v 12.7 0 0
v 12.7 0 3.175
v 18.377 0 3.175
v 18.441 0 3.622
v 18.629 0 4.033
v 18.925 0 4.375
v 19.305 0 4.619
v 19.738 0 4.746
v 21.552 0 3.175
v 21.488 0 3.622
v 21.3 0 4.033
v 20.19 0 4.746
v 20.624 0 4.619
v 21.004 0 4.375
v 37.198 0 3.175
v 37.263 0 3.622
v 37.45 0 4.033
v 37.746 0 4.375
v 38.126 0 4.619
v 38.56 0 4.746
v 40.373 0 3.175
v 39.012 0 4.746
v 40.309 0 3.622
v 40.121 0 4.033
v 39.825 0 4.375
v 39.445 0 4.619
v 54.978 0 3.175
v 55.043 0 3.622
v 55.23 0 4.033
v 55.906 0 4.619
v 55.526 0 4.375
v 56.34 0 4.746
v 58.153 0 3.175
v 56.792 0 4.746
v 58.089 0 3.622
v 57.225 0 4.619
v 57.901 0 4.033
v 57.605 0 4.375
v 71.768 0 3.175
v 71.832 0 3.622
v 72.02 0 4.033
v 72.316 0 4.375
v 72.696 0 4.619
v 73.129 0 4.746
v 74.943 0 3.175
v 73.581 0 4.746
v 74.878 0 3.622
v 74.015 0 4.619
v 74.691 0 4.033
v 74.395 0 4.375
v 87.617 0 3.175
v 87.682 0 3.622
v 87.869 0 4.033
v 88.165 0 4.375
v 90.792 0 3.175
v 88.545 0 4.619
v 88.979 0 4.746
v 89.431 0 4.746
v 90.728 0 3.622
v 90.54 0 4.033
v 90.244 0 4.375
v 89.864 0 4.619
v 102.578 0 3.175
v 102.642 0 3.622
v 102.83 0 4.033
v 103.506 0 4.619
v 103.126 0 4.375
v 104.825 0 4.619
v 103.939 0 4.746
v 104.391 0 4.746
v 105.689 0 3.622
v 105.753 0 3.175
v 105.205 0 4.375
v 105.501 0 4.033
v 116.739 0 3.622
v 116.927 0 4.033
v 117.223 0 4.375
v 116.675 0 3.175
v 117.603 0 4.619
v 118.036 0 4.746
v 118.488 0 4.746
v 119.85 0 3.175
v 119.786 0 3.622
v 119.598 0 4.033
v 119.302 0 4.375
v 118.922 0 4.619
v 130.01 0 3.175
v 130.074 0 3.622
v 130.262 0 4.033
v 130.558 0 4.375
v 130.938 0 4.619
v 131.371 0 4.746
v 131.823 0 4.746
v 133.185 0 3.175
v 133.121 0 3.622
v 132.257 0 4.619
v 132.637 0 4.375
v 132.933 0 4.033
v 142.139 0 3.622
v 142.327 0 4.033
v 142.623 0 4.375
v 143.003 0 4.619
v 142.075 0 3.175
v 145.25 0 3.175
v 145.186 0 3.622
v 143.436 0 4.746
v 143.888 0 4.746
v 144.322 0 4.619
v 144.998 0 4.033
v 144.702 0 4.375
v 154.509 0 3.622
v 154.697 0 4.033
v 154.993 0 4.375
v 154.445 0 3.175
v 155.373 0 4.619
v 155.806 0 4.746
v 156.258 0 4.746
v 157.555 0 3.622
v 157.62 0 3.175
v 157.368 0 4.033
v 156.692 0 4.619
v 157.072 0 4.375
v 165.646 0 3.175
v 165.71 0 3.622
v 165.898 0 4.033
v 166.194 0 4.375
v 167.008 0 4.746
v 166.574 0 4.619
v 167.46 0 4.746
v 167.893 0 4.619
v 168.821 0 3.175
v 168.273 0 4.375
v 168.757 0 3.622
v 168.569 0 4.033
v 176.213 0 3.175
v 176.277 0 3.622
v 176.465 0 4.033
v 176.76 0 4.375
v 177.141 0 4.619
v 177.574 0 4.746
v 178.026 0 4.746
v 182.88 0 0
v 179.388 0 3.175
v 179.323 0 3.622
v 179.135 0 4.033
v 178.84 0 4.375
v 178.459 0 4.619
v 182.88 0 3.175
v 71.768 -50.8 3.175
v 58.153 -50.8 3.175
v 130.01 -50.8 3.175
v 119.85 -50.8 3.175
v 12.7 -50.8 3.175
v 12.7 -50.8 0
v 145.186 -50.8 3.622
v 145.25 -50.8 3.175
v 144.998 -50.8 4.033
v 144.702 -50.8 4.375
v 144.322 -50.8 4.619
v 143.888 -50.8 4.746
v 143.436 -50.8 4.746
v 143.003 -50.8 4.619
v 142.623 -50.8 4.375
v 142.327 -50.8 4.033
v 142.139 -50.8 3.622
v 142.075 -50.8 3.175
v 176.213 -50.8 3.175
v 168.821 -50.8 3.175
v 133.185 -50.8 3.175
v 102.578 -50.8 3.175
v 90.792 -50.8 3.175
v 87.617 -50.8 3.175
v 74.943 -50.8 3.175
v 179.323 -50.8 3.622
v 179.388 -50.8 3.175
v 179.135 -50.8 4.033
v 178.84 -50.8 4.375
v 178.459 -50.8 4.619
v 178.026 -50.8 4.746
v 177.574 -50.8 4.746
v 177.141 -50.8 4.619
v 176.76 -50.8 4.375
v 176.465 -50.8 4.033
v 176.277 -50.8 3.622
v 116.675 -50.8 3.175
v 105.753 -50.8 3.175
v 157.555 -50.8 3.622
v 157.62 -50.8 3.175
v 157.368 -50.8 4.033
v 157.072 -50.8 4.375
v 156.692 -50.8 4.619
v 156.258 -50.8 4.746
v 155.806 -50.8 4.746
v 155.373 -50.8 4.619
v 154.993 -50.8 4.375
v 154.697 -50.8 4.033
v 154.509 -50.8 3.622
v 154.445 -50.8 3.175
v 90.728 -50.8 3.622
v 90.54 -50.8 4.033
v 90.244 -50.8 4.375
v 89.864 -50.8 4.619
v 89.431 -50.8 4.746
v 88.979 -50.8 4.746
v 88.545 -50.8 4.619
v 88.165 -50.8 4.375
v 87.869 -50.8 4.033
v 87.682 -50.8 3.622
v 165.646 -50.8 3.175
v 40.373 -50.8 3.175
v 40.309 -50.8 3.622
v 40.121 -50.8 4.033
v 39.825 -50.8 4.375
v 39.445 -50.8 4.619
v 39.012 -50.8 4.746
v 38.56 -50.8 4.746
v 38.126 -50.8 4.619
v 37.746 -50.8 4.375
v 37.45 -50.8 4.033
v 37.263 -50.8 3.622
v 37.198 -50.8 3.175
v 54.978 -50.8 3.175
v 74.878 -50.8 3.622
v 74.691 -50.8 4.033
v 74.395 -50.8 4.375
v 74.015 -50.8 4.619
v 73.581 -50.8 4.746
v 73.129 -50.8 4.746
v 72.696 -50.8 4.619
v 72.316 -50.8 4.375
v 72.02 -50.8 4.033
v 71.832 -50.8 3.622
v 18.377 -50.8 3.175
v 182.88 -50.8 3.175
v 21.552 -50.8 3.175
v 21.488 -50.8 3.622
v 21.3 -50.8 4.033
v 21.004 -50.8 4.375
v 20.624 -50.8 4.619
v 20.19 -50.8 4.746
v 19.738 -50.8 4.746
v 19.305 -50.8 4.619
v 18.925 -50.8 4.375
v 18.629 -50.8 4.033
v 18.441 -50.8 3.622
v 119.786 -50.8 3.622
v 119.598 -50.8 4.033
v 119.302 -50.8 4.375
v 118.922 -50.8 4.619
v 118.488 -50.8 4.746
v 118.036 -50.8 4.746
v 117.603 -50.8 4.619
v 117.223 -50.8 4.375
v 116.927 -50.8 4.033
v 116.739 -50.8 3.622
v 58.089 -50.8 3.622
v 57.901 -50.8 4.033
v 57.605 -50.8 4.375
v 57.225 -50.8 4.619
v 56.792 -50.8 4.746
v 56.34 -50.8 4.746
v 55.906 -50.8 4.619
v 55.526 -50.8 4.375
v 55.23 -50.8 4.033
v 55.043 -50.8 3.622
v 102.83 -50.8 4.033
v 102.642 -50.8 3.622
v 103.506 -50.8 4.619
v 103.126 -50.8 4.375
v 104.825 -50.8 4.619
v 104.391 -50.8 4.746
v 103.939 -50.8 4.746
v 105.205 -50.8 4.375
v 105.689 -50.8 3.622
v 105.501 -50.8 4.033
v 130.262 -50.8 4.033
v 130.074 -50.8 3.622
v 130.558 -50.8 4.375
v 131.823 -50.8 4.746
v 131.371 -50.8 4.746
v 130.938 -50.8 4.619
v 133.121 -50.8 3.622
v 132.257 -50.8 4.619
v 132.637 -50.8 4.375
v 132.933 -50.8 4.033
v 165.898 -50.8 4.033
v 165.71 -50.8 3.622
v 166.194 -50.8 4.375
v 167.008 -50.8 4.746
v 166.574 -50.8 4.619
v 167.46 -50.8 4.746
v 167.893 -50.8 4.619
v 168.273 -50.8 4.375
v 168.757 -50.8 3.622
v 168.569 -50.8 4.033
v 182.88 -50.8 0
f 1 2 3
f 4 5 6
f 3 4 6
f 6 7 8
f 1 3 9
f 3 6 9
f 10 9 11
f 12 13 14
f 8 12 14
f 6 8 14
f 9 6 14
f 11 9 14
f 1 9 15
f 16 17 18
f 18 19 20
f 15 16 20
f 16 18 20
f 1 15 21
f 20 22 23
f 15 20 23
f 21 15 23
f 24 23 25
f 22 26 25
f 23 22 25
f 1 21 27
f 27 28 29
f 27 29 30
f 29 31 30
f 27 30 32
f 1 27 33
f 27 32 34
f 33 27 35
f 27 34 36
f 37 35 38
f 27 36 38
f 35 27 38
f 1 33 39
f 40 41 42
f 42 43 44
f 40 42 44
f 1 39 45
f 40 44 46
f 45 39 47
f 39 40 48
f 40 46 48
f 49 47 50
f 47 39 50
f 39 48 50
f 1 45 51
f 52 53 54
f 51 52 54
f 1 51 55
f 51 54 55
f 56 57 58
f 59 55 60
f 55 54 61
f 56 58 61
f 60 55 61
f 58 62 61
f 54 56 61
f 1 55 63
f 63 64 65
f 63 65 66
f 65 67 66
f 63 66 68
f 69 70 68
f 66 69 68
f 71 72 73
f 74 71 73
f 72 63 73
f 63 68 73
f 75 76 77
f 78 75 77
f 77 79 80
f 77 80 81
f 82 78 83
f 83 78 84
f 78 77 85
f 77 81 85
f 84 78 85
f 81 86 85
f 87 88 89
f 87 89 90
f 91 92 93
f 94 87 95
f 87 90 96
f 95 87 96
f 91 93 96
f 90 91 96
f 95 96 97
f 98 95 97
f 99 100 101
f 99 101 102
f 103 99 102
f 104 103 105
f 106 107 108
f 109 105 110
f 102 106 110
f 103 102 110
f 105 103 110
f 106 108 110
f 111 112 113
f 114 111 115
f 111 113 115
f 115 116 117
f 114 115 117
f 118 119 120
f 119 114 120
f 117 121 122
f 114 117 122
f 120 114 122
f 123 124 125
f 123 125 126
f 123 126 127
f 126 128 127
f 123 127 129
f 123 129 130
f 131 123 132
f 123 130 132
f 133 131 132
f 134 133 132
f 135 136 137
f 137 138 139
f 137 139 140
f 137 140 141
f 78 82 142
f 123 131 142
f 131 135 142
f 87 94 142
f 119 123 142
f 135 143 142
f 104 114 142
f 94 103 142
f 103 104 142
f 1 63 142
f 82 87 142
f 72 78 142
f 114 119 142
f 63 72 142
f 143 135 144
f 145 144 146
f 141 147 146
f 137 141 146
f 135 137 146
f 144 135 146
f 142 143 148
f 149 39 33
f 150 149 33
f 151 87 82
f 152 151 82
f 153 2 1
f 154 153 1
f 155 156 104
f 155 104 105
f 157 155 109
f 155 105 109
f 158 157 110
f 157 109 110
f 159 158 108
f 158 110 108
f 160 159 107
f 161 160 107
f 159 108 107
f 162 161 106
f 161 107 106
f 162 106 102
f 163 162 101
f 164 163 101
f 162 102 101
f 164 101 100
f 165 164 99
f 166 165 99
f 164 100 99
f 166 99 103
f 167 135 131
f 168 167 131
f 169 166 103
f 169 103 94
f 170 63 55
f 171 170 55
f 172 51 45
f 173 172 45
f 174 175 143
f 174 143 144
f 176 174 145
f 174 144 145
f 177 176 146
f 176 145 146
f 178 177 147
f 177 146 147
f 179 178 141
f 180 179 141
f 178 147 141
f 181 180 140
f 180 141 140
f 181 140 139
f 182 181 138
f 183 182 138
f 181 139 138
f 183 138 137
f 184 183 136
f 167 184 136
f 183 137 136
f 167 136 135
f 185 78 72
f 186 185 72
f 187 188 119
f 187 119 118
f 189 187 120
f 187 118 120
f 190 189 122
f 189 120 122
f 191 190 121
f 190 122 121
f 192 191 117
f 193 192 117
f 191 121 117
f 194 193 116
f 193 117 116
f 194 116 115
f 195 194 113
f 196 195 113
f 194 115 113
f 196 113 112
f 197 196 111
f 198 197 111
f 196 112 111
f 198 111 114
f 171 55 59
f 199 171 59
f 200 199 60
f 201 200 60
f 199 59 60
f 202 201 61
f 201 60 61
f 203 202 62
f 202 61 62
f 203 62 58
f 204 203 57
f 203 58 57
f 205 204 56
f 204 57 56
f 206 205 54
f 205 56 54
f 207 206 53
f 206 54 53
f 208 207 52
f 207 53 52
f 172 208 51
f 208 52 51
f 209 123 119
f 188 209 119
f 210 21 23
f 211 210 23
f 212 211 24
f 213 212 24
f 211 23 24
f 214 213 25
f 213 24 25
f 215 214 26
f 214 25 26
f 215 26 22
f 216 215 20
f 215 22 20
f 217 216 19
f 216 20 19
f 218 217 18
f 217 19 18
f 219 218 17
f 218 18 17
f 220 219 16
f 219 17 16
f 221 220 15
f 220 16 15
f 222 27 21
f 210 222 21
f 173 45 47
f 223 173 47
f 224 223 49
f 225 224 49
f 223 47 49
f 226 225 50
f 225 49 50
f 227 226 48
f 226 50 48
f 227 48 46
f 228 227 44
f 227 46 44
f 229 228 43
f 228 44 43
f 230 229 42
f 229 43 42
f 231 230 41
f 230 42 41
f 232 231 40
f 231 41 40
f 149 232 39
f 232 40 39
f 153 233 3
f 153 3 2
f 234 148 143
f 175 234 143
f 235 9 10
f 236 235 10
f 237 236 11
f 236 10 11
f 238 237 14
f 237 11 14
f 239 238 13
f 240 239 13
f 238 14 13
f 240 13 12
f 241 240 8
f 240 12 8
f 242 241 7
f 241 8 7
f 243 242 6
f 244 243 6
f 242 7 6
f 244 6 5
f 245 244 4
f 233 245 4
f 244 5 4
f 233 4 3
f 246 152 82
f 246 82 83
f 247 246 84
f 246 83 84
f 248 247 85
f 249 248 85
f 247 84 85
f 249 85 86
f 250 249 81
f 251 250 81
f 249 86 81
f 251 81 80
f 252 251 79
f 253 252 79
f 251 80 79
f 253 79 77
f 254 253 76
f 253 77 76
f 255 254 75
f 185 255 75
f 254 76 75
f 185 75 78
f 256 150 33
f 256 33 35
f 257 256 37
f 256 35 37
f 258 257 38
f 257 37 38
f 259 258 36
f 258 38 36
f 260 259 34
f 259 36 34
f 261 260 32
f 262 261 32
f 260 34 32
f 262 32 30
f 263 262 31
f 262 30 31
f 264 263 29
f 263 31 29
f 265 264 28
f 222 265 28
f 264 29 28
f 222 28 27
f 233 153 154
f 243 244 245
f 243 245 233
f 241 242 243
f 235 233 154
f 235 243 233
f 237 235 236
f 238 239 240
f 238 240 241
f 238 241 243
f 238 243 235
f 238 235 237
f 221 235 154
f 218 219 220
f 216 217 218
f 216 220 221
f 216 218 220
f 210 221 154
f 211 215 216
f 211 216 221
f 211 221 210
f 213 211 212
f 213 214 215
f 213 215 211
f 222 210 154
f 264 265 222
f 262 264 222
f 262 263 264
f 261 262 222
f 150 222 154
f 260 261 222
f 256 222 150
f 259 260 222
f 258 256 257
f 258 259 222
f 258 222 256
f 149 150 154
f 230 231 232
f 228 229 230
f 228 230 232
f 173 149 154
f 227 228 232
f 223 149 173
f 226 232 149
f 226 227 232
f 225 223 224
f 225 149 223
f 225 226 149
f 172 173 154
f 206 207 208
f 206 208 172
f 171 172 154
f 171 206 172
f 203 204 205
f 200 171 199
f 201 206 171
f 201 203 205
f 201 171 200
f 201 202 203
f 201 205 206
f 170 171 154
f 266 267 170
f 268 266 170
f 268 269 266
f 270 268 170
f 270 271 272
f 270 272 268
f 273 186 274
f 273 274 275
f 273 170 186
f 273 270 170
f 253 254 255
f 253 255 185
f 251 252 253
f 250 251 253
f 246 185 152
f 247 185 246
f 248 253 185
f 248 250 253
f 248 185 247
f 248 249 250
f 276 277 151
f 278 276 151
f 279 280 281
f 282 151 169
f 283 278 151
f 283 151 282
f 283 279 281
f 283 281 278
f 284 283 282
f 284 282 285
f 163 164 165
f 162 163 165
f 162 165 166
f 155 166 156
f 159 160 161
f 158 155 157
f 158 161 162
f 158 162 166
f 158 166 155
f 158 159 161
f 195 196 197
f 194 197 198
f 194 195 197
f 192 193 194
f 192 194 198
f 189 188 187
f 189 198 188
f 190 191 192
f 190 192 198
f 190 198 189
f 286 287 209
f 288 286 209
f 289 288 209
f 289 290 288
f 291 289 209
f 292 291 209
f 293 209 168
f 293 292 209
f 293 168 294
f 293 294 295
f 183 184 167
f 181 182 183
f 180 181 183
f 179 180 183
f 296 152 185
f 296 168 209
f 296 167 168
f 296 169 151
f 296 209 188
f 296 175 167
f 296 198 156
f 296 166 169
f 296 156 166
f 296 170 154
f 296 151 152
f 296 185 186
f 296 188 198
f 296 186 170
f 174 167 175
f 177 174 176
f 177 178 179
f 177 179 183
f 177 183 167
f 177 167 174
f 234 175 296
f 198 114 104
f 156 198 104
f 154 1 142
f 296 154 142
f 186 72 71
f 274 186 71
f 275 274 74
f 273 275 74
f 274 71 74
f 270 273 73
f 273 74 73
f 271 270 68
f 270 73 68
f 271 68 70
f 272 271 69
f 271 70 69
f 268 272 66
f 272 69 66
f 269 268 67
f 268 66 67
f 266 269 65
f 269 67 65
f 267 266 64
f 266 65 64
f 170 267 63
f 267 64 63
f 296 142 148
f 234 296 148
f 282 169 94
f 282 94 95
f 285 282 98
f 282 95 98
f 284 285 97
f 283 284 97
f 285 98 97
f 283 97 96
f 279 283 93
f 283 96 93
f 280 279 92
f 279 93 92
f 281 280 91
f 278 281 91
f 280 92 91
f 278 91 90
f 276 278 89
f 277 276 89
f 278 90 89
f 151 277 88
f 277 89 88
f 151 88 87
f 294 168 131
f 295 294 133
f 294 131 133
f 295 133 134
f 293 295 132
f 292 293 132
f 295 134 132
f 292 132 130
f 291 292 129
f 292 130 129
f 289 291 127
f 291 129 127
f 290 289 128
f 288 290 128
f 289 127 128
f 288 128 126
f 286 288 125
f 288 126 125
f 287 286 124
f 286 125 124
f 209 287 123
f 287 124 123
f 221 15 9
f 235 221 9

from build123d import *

# Parameters (mm, degrees)
F1_DEPTH = 50.8


with BuildPart() as f1:
    # F0 (on Front) → F1 (new body)
    with BuildSketch(Plane.XZ):
        with BuildLine():
            Line((12.7, 3.175), (12.7, 0))
            Line((12.7, 0), (182.88, 0))
            Line((182.88, 0), (182.88, 3.175))
            Line((182.88, 3.175), (179.3875, 3.175))
            ThreePointArc((179.3875, 3.175), (177.8, 4.7625), (176.2125, 3.175))
            Line((176.2125, 3.175), (168.8211, 3.175))
            ThreePointArc((168.8211, 3.175), (167.2336, 4.7625), (165.6461, 3.175))
            Line((165.6461, 3.175), (157.6197, 3.175))
            ThreePointArc((157.6197, 3.175), (156.0322, 4.7625), (154.4447, 3.175))
            Line((154.4447, 3.175), (145.2499, 3.175))
            ThreePointArc((145.2499, 3.175), (143.6624, 4.7625), (142.0749, 3.175))
            Line((142.0749, 3.175), (133.1849, 3.175))
            ThreePointArc((133.1849, 3.175), (131.5974, 4.7625), (130.0099, 3.175))
            Line((130.0099, 3.175), (119.8499, 3.175))
            ThreePointArc((119.8499, 3.175), (118.2624, 4.7625), (116.6749, 3.175))
            Line((116.6749, 3.175), (105.7529, 3.175))
            ThreePointArc((105.7529, 3.175), (104.1654, 4.7625), (102.5779, 3.175))
            Line((102.5779, 3.175), (90.7923, 3.175))
            ThreePointArc((90.7923, 3.175), (89.2048, 4.7625), (87.6173, 3.175))
            Line((87.6173, 3.175), (74.9427, 3.175))
            ThreePointArc((74.9427, 3.175), (73.3552, 4.7625), (71.7677, 3.175))
            Line((71.7677, 3.175), (58.1533, 3.175))
            ThreePointArc((58.1533, 3.175), (56.5658, 4.7625), (54.9783, 3.175))
            Line((54.9783, 3.175), (40.3733, 3.175))
            ThreePointArc((40.3733, 3.175), (38.7858, 4.7625), (37.1983, 3.175))
            Line((37.1983, 3.175), (21.5519, 3.175))
            ThreePointArc((21.5519, 3.175), (19.9644, 4.7625), (18.3769, 3.175))
            Line((18.3769, 3.175), (12.7, 3.175))
        make_face()
    extrude(amount=F1_DEPTH)


solid = f1.part
